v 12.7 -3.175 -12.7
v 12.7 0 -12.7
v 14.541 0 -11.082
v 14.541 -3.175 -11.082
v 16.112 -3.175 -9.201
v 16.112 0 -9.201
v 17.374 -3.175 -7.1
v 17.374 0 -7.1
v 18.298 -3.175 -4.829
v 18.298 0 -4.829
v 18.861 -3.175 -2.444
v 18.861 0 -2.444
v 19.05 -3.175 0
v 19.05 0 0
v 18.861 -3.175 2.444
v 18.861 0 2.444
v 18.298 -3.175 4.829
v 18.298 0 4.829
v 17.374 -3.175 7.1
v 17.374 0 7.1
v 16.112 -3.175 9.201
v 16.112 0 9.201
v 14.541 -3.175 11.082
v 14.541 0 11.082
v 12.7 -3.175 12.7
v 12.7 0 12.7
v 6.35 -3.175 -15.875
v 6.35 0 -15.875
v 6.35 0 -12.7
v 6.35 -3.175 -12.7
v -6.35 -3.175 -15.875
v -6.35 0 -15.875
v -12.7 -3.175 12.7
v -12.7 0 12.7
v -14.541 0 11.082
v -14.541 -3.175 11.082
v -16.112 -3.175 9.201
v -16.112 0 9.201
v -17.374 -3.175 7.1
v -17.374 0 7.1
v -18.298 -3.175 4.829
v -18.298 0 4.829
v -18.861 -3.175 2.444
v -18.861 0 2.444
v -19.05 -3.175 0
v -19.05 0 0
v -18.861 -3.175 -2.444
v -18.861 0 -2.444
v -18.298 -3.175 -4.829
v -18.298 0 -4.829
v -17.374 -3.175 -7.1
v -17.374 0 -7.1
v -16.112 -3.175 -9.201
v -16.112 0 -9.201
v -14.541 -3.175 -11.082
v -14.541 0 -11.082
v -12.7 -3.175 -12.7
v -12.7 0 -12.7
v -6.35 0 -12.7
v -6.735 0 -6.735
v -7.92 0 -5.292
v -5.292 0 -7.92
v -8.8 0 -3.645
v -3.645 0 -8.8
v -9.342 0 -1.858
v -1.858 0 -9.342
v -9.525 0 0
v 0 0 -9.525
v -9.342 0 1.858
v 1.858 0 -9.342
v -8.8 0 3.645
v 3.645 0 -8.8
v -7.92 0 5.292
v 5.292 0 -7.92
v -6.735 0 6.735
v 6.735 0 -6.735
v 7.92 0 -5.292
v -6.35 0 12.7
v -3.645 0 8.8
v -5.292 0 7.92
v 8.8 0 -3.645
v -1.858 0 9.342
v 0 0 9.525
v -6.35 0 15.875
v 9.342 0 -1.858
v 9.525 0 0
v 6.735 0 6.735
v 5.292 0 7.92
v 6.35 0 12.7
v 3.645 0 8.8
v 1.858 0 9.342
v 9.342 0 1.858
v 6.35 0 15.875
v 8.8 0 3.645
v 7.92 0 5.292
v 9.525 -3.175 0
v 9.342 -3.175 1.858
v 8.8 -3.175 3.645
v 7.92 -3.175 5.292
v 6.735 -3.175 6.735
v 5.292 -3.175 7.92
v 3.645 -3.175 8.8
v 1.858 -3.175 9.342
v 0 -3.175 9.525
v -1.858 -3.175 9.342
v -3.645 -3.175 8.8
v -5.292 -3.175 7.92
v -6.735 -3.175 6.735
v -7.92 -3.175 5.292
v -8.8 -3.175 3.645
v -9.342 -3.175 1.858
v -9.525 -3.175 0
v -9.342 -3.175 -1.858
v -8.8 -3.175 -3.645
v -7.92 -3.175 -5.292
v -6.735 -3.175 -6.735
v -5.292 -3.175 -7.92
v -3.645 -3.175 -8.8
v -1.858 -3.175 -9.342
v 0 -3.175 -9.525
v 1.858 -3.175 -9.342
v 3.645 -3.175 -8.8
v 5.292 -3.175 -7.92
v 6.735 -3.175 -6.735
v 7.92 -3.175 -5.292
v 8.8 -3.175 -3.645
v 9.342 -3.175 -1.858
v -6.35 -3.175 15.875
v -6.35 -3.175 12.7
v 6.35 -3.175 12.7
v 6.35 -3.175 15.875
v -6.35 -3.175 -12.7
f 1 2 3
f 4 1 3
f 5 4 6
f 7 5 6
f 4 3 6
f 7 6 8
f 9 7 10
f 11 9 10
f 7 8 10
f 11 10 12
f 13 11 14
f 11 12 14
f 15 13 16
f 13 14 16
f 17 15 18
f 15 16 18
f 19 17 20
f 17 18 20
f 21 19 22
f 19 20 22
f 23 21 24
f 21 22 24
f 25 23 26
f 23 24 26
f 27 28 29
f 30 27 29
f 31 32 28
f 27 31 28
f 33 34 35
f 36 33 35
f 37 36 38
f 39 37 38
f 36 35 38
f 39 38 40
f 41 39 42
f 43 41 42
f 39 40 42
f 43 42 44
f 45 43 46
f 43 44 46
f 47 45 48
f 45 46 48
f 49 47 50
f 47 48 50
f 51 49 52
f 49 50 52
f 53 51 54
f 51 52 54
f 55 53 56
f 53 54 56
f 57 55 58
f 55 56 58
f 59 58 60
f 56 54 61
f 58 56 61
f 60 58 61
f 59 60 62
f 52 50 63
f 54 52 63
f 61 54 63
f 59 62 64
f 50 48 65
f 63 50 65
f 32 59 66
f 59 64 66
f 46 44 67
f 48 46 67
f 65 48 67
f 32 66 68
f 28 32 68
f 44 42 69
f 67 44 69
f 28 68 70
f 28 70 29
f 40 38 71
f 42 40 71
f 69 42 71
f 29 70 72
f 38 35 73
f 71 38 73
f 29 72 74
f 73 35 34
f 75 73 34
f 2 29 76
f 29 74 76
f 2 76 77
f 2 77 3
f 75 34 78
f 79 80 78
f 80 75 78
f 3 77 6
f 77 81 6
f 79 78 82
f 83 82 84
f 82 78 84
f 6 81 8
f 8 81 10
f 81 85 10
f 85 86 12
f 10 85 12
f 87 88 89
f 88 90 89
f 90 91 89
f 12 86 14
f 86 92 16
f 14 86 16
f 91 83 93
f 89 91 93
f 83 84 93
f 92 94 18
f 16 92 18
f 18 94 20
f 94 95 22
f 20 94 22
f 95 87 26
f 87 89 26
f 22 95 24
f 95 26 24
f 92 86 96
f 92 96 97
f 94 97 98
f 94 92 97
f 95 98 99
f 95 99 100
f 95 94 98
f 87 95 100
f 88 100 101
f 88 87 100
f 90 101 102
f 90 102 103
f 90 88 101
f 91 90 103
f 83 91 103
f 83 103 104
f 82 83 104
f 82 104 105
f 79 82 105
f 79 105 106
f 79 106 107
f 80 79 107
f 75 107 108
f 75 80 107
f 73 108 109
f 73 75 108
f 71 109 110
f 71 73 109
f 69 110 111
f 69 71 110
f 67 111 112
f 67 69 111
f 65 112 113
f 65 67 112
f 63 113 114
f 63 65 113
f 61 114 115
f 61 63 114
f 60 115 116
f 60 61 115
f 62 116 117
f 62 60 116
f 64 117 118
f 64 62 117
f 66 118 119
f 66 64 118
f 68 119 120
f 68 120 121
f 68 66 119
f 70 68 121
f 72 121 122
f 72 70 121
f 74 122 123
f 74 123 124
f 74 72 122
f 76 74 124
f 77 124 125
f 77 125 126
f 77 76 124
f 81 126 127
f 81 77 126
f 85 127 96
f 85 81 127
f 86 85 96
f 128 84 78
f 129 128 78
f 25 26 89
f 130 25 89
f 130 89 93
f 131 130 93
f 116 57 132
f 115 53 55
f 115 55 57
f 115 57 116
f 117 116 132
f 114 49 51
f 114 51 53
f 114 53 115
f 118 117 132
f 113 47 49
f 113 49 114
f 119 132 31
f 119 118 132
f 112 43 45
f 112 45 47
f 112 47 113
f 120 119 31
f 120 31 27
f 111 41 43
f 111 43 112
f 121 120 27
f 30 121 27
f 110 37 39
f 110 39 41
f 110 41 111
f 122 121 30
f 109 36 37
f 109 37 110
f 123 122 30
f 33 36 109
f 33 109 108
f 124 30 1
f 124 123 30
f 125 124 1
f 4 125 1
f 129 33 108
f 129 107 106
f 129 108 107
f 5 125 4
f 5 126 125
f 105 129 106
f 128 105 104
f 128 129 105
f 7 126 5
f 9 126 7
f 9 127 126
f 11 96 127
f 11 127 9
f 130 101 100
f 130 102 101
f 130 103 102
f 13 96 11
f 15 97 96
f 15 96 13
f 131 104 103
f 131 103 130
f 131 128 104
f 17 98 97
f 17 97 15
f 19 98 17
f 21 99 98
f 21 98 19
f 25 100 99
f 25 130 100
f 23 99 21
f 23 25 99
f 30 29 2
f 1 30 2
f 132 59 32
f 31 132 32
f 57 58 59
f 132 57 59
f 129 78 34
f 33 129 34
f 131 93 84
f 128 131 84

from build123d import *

# Parameters (mm, degrees)
F0_R     = 9.525
F1_DEPTH = 3.175


with BuildPart() as f1:
    # F0 (on Front) → F1 (new body)
    with BuildSketch(Plane.XZ):
        with BuildLine():
            Line((-6.35, 12.7), (-12.7, 12.7))
            ThreePointArc((-12.7, 12.7), (-19.05, 0), (-12.7, -12.7))
            Line((-12.7, -12.7), (-6.35, -12.7))
            Line((-6.35, -12.7), (-6.35, -15.875))
            Line((-6.35, -15.875), (6.35, -15.875))
            Line((6.35, -15.875), (6.35, -12.7))
            Line((6.35, -12.7), (12.7, -12.7))
            ThreePointArc((12.7, -12.7), (19.05, 0), (12.7, 12.7))
            Line((12.7, 12.7), (6.35, 12.7))
            Line((6.35, 12.7), (6.35, 15.875))
            Line((6.35, 15.875), (-6.35, 15.875))
            Line((-6.35, 15.875), (-6.35, 12.7))
        make_face()
        Circle(F0_R, mode=Mode.SUBTRACT)
    extrude(amount=F1_DEPTH)


solid = f1.part
